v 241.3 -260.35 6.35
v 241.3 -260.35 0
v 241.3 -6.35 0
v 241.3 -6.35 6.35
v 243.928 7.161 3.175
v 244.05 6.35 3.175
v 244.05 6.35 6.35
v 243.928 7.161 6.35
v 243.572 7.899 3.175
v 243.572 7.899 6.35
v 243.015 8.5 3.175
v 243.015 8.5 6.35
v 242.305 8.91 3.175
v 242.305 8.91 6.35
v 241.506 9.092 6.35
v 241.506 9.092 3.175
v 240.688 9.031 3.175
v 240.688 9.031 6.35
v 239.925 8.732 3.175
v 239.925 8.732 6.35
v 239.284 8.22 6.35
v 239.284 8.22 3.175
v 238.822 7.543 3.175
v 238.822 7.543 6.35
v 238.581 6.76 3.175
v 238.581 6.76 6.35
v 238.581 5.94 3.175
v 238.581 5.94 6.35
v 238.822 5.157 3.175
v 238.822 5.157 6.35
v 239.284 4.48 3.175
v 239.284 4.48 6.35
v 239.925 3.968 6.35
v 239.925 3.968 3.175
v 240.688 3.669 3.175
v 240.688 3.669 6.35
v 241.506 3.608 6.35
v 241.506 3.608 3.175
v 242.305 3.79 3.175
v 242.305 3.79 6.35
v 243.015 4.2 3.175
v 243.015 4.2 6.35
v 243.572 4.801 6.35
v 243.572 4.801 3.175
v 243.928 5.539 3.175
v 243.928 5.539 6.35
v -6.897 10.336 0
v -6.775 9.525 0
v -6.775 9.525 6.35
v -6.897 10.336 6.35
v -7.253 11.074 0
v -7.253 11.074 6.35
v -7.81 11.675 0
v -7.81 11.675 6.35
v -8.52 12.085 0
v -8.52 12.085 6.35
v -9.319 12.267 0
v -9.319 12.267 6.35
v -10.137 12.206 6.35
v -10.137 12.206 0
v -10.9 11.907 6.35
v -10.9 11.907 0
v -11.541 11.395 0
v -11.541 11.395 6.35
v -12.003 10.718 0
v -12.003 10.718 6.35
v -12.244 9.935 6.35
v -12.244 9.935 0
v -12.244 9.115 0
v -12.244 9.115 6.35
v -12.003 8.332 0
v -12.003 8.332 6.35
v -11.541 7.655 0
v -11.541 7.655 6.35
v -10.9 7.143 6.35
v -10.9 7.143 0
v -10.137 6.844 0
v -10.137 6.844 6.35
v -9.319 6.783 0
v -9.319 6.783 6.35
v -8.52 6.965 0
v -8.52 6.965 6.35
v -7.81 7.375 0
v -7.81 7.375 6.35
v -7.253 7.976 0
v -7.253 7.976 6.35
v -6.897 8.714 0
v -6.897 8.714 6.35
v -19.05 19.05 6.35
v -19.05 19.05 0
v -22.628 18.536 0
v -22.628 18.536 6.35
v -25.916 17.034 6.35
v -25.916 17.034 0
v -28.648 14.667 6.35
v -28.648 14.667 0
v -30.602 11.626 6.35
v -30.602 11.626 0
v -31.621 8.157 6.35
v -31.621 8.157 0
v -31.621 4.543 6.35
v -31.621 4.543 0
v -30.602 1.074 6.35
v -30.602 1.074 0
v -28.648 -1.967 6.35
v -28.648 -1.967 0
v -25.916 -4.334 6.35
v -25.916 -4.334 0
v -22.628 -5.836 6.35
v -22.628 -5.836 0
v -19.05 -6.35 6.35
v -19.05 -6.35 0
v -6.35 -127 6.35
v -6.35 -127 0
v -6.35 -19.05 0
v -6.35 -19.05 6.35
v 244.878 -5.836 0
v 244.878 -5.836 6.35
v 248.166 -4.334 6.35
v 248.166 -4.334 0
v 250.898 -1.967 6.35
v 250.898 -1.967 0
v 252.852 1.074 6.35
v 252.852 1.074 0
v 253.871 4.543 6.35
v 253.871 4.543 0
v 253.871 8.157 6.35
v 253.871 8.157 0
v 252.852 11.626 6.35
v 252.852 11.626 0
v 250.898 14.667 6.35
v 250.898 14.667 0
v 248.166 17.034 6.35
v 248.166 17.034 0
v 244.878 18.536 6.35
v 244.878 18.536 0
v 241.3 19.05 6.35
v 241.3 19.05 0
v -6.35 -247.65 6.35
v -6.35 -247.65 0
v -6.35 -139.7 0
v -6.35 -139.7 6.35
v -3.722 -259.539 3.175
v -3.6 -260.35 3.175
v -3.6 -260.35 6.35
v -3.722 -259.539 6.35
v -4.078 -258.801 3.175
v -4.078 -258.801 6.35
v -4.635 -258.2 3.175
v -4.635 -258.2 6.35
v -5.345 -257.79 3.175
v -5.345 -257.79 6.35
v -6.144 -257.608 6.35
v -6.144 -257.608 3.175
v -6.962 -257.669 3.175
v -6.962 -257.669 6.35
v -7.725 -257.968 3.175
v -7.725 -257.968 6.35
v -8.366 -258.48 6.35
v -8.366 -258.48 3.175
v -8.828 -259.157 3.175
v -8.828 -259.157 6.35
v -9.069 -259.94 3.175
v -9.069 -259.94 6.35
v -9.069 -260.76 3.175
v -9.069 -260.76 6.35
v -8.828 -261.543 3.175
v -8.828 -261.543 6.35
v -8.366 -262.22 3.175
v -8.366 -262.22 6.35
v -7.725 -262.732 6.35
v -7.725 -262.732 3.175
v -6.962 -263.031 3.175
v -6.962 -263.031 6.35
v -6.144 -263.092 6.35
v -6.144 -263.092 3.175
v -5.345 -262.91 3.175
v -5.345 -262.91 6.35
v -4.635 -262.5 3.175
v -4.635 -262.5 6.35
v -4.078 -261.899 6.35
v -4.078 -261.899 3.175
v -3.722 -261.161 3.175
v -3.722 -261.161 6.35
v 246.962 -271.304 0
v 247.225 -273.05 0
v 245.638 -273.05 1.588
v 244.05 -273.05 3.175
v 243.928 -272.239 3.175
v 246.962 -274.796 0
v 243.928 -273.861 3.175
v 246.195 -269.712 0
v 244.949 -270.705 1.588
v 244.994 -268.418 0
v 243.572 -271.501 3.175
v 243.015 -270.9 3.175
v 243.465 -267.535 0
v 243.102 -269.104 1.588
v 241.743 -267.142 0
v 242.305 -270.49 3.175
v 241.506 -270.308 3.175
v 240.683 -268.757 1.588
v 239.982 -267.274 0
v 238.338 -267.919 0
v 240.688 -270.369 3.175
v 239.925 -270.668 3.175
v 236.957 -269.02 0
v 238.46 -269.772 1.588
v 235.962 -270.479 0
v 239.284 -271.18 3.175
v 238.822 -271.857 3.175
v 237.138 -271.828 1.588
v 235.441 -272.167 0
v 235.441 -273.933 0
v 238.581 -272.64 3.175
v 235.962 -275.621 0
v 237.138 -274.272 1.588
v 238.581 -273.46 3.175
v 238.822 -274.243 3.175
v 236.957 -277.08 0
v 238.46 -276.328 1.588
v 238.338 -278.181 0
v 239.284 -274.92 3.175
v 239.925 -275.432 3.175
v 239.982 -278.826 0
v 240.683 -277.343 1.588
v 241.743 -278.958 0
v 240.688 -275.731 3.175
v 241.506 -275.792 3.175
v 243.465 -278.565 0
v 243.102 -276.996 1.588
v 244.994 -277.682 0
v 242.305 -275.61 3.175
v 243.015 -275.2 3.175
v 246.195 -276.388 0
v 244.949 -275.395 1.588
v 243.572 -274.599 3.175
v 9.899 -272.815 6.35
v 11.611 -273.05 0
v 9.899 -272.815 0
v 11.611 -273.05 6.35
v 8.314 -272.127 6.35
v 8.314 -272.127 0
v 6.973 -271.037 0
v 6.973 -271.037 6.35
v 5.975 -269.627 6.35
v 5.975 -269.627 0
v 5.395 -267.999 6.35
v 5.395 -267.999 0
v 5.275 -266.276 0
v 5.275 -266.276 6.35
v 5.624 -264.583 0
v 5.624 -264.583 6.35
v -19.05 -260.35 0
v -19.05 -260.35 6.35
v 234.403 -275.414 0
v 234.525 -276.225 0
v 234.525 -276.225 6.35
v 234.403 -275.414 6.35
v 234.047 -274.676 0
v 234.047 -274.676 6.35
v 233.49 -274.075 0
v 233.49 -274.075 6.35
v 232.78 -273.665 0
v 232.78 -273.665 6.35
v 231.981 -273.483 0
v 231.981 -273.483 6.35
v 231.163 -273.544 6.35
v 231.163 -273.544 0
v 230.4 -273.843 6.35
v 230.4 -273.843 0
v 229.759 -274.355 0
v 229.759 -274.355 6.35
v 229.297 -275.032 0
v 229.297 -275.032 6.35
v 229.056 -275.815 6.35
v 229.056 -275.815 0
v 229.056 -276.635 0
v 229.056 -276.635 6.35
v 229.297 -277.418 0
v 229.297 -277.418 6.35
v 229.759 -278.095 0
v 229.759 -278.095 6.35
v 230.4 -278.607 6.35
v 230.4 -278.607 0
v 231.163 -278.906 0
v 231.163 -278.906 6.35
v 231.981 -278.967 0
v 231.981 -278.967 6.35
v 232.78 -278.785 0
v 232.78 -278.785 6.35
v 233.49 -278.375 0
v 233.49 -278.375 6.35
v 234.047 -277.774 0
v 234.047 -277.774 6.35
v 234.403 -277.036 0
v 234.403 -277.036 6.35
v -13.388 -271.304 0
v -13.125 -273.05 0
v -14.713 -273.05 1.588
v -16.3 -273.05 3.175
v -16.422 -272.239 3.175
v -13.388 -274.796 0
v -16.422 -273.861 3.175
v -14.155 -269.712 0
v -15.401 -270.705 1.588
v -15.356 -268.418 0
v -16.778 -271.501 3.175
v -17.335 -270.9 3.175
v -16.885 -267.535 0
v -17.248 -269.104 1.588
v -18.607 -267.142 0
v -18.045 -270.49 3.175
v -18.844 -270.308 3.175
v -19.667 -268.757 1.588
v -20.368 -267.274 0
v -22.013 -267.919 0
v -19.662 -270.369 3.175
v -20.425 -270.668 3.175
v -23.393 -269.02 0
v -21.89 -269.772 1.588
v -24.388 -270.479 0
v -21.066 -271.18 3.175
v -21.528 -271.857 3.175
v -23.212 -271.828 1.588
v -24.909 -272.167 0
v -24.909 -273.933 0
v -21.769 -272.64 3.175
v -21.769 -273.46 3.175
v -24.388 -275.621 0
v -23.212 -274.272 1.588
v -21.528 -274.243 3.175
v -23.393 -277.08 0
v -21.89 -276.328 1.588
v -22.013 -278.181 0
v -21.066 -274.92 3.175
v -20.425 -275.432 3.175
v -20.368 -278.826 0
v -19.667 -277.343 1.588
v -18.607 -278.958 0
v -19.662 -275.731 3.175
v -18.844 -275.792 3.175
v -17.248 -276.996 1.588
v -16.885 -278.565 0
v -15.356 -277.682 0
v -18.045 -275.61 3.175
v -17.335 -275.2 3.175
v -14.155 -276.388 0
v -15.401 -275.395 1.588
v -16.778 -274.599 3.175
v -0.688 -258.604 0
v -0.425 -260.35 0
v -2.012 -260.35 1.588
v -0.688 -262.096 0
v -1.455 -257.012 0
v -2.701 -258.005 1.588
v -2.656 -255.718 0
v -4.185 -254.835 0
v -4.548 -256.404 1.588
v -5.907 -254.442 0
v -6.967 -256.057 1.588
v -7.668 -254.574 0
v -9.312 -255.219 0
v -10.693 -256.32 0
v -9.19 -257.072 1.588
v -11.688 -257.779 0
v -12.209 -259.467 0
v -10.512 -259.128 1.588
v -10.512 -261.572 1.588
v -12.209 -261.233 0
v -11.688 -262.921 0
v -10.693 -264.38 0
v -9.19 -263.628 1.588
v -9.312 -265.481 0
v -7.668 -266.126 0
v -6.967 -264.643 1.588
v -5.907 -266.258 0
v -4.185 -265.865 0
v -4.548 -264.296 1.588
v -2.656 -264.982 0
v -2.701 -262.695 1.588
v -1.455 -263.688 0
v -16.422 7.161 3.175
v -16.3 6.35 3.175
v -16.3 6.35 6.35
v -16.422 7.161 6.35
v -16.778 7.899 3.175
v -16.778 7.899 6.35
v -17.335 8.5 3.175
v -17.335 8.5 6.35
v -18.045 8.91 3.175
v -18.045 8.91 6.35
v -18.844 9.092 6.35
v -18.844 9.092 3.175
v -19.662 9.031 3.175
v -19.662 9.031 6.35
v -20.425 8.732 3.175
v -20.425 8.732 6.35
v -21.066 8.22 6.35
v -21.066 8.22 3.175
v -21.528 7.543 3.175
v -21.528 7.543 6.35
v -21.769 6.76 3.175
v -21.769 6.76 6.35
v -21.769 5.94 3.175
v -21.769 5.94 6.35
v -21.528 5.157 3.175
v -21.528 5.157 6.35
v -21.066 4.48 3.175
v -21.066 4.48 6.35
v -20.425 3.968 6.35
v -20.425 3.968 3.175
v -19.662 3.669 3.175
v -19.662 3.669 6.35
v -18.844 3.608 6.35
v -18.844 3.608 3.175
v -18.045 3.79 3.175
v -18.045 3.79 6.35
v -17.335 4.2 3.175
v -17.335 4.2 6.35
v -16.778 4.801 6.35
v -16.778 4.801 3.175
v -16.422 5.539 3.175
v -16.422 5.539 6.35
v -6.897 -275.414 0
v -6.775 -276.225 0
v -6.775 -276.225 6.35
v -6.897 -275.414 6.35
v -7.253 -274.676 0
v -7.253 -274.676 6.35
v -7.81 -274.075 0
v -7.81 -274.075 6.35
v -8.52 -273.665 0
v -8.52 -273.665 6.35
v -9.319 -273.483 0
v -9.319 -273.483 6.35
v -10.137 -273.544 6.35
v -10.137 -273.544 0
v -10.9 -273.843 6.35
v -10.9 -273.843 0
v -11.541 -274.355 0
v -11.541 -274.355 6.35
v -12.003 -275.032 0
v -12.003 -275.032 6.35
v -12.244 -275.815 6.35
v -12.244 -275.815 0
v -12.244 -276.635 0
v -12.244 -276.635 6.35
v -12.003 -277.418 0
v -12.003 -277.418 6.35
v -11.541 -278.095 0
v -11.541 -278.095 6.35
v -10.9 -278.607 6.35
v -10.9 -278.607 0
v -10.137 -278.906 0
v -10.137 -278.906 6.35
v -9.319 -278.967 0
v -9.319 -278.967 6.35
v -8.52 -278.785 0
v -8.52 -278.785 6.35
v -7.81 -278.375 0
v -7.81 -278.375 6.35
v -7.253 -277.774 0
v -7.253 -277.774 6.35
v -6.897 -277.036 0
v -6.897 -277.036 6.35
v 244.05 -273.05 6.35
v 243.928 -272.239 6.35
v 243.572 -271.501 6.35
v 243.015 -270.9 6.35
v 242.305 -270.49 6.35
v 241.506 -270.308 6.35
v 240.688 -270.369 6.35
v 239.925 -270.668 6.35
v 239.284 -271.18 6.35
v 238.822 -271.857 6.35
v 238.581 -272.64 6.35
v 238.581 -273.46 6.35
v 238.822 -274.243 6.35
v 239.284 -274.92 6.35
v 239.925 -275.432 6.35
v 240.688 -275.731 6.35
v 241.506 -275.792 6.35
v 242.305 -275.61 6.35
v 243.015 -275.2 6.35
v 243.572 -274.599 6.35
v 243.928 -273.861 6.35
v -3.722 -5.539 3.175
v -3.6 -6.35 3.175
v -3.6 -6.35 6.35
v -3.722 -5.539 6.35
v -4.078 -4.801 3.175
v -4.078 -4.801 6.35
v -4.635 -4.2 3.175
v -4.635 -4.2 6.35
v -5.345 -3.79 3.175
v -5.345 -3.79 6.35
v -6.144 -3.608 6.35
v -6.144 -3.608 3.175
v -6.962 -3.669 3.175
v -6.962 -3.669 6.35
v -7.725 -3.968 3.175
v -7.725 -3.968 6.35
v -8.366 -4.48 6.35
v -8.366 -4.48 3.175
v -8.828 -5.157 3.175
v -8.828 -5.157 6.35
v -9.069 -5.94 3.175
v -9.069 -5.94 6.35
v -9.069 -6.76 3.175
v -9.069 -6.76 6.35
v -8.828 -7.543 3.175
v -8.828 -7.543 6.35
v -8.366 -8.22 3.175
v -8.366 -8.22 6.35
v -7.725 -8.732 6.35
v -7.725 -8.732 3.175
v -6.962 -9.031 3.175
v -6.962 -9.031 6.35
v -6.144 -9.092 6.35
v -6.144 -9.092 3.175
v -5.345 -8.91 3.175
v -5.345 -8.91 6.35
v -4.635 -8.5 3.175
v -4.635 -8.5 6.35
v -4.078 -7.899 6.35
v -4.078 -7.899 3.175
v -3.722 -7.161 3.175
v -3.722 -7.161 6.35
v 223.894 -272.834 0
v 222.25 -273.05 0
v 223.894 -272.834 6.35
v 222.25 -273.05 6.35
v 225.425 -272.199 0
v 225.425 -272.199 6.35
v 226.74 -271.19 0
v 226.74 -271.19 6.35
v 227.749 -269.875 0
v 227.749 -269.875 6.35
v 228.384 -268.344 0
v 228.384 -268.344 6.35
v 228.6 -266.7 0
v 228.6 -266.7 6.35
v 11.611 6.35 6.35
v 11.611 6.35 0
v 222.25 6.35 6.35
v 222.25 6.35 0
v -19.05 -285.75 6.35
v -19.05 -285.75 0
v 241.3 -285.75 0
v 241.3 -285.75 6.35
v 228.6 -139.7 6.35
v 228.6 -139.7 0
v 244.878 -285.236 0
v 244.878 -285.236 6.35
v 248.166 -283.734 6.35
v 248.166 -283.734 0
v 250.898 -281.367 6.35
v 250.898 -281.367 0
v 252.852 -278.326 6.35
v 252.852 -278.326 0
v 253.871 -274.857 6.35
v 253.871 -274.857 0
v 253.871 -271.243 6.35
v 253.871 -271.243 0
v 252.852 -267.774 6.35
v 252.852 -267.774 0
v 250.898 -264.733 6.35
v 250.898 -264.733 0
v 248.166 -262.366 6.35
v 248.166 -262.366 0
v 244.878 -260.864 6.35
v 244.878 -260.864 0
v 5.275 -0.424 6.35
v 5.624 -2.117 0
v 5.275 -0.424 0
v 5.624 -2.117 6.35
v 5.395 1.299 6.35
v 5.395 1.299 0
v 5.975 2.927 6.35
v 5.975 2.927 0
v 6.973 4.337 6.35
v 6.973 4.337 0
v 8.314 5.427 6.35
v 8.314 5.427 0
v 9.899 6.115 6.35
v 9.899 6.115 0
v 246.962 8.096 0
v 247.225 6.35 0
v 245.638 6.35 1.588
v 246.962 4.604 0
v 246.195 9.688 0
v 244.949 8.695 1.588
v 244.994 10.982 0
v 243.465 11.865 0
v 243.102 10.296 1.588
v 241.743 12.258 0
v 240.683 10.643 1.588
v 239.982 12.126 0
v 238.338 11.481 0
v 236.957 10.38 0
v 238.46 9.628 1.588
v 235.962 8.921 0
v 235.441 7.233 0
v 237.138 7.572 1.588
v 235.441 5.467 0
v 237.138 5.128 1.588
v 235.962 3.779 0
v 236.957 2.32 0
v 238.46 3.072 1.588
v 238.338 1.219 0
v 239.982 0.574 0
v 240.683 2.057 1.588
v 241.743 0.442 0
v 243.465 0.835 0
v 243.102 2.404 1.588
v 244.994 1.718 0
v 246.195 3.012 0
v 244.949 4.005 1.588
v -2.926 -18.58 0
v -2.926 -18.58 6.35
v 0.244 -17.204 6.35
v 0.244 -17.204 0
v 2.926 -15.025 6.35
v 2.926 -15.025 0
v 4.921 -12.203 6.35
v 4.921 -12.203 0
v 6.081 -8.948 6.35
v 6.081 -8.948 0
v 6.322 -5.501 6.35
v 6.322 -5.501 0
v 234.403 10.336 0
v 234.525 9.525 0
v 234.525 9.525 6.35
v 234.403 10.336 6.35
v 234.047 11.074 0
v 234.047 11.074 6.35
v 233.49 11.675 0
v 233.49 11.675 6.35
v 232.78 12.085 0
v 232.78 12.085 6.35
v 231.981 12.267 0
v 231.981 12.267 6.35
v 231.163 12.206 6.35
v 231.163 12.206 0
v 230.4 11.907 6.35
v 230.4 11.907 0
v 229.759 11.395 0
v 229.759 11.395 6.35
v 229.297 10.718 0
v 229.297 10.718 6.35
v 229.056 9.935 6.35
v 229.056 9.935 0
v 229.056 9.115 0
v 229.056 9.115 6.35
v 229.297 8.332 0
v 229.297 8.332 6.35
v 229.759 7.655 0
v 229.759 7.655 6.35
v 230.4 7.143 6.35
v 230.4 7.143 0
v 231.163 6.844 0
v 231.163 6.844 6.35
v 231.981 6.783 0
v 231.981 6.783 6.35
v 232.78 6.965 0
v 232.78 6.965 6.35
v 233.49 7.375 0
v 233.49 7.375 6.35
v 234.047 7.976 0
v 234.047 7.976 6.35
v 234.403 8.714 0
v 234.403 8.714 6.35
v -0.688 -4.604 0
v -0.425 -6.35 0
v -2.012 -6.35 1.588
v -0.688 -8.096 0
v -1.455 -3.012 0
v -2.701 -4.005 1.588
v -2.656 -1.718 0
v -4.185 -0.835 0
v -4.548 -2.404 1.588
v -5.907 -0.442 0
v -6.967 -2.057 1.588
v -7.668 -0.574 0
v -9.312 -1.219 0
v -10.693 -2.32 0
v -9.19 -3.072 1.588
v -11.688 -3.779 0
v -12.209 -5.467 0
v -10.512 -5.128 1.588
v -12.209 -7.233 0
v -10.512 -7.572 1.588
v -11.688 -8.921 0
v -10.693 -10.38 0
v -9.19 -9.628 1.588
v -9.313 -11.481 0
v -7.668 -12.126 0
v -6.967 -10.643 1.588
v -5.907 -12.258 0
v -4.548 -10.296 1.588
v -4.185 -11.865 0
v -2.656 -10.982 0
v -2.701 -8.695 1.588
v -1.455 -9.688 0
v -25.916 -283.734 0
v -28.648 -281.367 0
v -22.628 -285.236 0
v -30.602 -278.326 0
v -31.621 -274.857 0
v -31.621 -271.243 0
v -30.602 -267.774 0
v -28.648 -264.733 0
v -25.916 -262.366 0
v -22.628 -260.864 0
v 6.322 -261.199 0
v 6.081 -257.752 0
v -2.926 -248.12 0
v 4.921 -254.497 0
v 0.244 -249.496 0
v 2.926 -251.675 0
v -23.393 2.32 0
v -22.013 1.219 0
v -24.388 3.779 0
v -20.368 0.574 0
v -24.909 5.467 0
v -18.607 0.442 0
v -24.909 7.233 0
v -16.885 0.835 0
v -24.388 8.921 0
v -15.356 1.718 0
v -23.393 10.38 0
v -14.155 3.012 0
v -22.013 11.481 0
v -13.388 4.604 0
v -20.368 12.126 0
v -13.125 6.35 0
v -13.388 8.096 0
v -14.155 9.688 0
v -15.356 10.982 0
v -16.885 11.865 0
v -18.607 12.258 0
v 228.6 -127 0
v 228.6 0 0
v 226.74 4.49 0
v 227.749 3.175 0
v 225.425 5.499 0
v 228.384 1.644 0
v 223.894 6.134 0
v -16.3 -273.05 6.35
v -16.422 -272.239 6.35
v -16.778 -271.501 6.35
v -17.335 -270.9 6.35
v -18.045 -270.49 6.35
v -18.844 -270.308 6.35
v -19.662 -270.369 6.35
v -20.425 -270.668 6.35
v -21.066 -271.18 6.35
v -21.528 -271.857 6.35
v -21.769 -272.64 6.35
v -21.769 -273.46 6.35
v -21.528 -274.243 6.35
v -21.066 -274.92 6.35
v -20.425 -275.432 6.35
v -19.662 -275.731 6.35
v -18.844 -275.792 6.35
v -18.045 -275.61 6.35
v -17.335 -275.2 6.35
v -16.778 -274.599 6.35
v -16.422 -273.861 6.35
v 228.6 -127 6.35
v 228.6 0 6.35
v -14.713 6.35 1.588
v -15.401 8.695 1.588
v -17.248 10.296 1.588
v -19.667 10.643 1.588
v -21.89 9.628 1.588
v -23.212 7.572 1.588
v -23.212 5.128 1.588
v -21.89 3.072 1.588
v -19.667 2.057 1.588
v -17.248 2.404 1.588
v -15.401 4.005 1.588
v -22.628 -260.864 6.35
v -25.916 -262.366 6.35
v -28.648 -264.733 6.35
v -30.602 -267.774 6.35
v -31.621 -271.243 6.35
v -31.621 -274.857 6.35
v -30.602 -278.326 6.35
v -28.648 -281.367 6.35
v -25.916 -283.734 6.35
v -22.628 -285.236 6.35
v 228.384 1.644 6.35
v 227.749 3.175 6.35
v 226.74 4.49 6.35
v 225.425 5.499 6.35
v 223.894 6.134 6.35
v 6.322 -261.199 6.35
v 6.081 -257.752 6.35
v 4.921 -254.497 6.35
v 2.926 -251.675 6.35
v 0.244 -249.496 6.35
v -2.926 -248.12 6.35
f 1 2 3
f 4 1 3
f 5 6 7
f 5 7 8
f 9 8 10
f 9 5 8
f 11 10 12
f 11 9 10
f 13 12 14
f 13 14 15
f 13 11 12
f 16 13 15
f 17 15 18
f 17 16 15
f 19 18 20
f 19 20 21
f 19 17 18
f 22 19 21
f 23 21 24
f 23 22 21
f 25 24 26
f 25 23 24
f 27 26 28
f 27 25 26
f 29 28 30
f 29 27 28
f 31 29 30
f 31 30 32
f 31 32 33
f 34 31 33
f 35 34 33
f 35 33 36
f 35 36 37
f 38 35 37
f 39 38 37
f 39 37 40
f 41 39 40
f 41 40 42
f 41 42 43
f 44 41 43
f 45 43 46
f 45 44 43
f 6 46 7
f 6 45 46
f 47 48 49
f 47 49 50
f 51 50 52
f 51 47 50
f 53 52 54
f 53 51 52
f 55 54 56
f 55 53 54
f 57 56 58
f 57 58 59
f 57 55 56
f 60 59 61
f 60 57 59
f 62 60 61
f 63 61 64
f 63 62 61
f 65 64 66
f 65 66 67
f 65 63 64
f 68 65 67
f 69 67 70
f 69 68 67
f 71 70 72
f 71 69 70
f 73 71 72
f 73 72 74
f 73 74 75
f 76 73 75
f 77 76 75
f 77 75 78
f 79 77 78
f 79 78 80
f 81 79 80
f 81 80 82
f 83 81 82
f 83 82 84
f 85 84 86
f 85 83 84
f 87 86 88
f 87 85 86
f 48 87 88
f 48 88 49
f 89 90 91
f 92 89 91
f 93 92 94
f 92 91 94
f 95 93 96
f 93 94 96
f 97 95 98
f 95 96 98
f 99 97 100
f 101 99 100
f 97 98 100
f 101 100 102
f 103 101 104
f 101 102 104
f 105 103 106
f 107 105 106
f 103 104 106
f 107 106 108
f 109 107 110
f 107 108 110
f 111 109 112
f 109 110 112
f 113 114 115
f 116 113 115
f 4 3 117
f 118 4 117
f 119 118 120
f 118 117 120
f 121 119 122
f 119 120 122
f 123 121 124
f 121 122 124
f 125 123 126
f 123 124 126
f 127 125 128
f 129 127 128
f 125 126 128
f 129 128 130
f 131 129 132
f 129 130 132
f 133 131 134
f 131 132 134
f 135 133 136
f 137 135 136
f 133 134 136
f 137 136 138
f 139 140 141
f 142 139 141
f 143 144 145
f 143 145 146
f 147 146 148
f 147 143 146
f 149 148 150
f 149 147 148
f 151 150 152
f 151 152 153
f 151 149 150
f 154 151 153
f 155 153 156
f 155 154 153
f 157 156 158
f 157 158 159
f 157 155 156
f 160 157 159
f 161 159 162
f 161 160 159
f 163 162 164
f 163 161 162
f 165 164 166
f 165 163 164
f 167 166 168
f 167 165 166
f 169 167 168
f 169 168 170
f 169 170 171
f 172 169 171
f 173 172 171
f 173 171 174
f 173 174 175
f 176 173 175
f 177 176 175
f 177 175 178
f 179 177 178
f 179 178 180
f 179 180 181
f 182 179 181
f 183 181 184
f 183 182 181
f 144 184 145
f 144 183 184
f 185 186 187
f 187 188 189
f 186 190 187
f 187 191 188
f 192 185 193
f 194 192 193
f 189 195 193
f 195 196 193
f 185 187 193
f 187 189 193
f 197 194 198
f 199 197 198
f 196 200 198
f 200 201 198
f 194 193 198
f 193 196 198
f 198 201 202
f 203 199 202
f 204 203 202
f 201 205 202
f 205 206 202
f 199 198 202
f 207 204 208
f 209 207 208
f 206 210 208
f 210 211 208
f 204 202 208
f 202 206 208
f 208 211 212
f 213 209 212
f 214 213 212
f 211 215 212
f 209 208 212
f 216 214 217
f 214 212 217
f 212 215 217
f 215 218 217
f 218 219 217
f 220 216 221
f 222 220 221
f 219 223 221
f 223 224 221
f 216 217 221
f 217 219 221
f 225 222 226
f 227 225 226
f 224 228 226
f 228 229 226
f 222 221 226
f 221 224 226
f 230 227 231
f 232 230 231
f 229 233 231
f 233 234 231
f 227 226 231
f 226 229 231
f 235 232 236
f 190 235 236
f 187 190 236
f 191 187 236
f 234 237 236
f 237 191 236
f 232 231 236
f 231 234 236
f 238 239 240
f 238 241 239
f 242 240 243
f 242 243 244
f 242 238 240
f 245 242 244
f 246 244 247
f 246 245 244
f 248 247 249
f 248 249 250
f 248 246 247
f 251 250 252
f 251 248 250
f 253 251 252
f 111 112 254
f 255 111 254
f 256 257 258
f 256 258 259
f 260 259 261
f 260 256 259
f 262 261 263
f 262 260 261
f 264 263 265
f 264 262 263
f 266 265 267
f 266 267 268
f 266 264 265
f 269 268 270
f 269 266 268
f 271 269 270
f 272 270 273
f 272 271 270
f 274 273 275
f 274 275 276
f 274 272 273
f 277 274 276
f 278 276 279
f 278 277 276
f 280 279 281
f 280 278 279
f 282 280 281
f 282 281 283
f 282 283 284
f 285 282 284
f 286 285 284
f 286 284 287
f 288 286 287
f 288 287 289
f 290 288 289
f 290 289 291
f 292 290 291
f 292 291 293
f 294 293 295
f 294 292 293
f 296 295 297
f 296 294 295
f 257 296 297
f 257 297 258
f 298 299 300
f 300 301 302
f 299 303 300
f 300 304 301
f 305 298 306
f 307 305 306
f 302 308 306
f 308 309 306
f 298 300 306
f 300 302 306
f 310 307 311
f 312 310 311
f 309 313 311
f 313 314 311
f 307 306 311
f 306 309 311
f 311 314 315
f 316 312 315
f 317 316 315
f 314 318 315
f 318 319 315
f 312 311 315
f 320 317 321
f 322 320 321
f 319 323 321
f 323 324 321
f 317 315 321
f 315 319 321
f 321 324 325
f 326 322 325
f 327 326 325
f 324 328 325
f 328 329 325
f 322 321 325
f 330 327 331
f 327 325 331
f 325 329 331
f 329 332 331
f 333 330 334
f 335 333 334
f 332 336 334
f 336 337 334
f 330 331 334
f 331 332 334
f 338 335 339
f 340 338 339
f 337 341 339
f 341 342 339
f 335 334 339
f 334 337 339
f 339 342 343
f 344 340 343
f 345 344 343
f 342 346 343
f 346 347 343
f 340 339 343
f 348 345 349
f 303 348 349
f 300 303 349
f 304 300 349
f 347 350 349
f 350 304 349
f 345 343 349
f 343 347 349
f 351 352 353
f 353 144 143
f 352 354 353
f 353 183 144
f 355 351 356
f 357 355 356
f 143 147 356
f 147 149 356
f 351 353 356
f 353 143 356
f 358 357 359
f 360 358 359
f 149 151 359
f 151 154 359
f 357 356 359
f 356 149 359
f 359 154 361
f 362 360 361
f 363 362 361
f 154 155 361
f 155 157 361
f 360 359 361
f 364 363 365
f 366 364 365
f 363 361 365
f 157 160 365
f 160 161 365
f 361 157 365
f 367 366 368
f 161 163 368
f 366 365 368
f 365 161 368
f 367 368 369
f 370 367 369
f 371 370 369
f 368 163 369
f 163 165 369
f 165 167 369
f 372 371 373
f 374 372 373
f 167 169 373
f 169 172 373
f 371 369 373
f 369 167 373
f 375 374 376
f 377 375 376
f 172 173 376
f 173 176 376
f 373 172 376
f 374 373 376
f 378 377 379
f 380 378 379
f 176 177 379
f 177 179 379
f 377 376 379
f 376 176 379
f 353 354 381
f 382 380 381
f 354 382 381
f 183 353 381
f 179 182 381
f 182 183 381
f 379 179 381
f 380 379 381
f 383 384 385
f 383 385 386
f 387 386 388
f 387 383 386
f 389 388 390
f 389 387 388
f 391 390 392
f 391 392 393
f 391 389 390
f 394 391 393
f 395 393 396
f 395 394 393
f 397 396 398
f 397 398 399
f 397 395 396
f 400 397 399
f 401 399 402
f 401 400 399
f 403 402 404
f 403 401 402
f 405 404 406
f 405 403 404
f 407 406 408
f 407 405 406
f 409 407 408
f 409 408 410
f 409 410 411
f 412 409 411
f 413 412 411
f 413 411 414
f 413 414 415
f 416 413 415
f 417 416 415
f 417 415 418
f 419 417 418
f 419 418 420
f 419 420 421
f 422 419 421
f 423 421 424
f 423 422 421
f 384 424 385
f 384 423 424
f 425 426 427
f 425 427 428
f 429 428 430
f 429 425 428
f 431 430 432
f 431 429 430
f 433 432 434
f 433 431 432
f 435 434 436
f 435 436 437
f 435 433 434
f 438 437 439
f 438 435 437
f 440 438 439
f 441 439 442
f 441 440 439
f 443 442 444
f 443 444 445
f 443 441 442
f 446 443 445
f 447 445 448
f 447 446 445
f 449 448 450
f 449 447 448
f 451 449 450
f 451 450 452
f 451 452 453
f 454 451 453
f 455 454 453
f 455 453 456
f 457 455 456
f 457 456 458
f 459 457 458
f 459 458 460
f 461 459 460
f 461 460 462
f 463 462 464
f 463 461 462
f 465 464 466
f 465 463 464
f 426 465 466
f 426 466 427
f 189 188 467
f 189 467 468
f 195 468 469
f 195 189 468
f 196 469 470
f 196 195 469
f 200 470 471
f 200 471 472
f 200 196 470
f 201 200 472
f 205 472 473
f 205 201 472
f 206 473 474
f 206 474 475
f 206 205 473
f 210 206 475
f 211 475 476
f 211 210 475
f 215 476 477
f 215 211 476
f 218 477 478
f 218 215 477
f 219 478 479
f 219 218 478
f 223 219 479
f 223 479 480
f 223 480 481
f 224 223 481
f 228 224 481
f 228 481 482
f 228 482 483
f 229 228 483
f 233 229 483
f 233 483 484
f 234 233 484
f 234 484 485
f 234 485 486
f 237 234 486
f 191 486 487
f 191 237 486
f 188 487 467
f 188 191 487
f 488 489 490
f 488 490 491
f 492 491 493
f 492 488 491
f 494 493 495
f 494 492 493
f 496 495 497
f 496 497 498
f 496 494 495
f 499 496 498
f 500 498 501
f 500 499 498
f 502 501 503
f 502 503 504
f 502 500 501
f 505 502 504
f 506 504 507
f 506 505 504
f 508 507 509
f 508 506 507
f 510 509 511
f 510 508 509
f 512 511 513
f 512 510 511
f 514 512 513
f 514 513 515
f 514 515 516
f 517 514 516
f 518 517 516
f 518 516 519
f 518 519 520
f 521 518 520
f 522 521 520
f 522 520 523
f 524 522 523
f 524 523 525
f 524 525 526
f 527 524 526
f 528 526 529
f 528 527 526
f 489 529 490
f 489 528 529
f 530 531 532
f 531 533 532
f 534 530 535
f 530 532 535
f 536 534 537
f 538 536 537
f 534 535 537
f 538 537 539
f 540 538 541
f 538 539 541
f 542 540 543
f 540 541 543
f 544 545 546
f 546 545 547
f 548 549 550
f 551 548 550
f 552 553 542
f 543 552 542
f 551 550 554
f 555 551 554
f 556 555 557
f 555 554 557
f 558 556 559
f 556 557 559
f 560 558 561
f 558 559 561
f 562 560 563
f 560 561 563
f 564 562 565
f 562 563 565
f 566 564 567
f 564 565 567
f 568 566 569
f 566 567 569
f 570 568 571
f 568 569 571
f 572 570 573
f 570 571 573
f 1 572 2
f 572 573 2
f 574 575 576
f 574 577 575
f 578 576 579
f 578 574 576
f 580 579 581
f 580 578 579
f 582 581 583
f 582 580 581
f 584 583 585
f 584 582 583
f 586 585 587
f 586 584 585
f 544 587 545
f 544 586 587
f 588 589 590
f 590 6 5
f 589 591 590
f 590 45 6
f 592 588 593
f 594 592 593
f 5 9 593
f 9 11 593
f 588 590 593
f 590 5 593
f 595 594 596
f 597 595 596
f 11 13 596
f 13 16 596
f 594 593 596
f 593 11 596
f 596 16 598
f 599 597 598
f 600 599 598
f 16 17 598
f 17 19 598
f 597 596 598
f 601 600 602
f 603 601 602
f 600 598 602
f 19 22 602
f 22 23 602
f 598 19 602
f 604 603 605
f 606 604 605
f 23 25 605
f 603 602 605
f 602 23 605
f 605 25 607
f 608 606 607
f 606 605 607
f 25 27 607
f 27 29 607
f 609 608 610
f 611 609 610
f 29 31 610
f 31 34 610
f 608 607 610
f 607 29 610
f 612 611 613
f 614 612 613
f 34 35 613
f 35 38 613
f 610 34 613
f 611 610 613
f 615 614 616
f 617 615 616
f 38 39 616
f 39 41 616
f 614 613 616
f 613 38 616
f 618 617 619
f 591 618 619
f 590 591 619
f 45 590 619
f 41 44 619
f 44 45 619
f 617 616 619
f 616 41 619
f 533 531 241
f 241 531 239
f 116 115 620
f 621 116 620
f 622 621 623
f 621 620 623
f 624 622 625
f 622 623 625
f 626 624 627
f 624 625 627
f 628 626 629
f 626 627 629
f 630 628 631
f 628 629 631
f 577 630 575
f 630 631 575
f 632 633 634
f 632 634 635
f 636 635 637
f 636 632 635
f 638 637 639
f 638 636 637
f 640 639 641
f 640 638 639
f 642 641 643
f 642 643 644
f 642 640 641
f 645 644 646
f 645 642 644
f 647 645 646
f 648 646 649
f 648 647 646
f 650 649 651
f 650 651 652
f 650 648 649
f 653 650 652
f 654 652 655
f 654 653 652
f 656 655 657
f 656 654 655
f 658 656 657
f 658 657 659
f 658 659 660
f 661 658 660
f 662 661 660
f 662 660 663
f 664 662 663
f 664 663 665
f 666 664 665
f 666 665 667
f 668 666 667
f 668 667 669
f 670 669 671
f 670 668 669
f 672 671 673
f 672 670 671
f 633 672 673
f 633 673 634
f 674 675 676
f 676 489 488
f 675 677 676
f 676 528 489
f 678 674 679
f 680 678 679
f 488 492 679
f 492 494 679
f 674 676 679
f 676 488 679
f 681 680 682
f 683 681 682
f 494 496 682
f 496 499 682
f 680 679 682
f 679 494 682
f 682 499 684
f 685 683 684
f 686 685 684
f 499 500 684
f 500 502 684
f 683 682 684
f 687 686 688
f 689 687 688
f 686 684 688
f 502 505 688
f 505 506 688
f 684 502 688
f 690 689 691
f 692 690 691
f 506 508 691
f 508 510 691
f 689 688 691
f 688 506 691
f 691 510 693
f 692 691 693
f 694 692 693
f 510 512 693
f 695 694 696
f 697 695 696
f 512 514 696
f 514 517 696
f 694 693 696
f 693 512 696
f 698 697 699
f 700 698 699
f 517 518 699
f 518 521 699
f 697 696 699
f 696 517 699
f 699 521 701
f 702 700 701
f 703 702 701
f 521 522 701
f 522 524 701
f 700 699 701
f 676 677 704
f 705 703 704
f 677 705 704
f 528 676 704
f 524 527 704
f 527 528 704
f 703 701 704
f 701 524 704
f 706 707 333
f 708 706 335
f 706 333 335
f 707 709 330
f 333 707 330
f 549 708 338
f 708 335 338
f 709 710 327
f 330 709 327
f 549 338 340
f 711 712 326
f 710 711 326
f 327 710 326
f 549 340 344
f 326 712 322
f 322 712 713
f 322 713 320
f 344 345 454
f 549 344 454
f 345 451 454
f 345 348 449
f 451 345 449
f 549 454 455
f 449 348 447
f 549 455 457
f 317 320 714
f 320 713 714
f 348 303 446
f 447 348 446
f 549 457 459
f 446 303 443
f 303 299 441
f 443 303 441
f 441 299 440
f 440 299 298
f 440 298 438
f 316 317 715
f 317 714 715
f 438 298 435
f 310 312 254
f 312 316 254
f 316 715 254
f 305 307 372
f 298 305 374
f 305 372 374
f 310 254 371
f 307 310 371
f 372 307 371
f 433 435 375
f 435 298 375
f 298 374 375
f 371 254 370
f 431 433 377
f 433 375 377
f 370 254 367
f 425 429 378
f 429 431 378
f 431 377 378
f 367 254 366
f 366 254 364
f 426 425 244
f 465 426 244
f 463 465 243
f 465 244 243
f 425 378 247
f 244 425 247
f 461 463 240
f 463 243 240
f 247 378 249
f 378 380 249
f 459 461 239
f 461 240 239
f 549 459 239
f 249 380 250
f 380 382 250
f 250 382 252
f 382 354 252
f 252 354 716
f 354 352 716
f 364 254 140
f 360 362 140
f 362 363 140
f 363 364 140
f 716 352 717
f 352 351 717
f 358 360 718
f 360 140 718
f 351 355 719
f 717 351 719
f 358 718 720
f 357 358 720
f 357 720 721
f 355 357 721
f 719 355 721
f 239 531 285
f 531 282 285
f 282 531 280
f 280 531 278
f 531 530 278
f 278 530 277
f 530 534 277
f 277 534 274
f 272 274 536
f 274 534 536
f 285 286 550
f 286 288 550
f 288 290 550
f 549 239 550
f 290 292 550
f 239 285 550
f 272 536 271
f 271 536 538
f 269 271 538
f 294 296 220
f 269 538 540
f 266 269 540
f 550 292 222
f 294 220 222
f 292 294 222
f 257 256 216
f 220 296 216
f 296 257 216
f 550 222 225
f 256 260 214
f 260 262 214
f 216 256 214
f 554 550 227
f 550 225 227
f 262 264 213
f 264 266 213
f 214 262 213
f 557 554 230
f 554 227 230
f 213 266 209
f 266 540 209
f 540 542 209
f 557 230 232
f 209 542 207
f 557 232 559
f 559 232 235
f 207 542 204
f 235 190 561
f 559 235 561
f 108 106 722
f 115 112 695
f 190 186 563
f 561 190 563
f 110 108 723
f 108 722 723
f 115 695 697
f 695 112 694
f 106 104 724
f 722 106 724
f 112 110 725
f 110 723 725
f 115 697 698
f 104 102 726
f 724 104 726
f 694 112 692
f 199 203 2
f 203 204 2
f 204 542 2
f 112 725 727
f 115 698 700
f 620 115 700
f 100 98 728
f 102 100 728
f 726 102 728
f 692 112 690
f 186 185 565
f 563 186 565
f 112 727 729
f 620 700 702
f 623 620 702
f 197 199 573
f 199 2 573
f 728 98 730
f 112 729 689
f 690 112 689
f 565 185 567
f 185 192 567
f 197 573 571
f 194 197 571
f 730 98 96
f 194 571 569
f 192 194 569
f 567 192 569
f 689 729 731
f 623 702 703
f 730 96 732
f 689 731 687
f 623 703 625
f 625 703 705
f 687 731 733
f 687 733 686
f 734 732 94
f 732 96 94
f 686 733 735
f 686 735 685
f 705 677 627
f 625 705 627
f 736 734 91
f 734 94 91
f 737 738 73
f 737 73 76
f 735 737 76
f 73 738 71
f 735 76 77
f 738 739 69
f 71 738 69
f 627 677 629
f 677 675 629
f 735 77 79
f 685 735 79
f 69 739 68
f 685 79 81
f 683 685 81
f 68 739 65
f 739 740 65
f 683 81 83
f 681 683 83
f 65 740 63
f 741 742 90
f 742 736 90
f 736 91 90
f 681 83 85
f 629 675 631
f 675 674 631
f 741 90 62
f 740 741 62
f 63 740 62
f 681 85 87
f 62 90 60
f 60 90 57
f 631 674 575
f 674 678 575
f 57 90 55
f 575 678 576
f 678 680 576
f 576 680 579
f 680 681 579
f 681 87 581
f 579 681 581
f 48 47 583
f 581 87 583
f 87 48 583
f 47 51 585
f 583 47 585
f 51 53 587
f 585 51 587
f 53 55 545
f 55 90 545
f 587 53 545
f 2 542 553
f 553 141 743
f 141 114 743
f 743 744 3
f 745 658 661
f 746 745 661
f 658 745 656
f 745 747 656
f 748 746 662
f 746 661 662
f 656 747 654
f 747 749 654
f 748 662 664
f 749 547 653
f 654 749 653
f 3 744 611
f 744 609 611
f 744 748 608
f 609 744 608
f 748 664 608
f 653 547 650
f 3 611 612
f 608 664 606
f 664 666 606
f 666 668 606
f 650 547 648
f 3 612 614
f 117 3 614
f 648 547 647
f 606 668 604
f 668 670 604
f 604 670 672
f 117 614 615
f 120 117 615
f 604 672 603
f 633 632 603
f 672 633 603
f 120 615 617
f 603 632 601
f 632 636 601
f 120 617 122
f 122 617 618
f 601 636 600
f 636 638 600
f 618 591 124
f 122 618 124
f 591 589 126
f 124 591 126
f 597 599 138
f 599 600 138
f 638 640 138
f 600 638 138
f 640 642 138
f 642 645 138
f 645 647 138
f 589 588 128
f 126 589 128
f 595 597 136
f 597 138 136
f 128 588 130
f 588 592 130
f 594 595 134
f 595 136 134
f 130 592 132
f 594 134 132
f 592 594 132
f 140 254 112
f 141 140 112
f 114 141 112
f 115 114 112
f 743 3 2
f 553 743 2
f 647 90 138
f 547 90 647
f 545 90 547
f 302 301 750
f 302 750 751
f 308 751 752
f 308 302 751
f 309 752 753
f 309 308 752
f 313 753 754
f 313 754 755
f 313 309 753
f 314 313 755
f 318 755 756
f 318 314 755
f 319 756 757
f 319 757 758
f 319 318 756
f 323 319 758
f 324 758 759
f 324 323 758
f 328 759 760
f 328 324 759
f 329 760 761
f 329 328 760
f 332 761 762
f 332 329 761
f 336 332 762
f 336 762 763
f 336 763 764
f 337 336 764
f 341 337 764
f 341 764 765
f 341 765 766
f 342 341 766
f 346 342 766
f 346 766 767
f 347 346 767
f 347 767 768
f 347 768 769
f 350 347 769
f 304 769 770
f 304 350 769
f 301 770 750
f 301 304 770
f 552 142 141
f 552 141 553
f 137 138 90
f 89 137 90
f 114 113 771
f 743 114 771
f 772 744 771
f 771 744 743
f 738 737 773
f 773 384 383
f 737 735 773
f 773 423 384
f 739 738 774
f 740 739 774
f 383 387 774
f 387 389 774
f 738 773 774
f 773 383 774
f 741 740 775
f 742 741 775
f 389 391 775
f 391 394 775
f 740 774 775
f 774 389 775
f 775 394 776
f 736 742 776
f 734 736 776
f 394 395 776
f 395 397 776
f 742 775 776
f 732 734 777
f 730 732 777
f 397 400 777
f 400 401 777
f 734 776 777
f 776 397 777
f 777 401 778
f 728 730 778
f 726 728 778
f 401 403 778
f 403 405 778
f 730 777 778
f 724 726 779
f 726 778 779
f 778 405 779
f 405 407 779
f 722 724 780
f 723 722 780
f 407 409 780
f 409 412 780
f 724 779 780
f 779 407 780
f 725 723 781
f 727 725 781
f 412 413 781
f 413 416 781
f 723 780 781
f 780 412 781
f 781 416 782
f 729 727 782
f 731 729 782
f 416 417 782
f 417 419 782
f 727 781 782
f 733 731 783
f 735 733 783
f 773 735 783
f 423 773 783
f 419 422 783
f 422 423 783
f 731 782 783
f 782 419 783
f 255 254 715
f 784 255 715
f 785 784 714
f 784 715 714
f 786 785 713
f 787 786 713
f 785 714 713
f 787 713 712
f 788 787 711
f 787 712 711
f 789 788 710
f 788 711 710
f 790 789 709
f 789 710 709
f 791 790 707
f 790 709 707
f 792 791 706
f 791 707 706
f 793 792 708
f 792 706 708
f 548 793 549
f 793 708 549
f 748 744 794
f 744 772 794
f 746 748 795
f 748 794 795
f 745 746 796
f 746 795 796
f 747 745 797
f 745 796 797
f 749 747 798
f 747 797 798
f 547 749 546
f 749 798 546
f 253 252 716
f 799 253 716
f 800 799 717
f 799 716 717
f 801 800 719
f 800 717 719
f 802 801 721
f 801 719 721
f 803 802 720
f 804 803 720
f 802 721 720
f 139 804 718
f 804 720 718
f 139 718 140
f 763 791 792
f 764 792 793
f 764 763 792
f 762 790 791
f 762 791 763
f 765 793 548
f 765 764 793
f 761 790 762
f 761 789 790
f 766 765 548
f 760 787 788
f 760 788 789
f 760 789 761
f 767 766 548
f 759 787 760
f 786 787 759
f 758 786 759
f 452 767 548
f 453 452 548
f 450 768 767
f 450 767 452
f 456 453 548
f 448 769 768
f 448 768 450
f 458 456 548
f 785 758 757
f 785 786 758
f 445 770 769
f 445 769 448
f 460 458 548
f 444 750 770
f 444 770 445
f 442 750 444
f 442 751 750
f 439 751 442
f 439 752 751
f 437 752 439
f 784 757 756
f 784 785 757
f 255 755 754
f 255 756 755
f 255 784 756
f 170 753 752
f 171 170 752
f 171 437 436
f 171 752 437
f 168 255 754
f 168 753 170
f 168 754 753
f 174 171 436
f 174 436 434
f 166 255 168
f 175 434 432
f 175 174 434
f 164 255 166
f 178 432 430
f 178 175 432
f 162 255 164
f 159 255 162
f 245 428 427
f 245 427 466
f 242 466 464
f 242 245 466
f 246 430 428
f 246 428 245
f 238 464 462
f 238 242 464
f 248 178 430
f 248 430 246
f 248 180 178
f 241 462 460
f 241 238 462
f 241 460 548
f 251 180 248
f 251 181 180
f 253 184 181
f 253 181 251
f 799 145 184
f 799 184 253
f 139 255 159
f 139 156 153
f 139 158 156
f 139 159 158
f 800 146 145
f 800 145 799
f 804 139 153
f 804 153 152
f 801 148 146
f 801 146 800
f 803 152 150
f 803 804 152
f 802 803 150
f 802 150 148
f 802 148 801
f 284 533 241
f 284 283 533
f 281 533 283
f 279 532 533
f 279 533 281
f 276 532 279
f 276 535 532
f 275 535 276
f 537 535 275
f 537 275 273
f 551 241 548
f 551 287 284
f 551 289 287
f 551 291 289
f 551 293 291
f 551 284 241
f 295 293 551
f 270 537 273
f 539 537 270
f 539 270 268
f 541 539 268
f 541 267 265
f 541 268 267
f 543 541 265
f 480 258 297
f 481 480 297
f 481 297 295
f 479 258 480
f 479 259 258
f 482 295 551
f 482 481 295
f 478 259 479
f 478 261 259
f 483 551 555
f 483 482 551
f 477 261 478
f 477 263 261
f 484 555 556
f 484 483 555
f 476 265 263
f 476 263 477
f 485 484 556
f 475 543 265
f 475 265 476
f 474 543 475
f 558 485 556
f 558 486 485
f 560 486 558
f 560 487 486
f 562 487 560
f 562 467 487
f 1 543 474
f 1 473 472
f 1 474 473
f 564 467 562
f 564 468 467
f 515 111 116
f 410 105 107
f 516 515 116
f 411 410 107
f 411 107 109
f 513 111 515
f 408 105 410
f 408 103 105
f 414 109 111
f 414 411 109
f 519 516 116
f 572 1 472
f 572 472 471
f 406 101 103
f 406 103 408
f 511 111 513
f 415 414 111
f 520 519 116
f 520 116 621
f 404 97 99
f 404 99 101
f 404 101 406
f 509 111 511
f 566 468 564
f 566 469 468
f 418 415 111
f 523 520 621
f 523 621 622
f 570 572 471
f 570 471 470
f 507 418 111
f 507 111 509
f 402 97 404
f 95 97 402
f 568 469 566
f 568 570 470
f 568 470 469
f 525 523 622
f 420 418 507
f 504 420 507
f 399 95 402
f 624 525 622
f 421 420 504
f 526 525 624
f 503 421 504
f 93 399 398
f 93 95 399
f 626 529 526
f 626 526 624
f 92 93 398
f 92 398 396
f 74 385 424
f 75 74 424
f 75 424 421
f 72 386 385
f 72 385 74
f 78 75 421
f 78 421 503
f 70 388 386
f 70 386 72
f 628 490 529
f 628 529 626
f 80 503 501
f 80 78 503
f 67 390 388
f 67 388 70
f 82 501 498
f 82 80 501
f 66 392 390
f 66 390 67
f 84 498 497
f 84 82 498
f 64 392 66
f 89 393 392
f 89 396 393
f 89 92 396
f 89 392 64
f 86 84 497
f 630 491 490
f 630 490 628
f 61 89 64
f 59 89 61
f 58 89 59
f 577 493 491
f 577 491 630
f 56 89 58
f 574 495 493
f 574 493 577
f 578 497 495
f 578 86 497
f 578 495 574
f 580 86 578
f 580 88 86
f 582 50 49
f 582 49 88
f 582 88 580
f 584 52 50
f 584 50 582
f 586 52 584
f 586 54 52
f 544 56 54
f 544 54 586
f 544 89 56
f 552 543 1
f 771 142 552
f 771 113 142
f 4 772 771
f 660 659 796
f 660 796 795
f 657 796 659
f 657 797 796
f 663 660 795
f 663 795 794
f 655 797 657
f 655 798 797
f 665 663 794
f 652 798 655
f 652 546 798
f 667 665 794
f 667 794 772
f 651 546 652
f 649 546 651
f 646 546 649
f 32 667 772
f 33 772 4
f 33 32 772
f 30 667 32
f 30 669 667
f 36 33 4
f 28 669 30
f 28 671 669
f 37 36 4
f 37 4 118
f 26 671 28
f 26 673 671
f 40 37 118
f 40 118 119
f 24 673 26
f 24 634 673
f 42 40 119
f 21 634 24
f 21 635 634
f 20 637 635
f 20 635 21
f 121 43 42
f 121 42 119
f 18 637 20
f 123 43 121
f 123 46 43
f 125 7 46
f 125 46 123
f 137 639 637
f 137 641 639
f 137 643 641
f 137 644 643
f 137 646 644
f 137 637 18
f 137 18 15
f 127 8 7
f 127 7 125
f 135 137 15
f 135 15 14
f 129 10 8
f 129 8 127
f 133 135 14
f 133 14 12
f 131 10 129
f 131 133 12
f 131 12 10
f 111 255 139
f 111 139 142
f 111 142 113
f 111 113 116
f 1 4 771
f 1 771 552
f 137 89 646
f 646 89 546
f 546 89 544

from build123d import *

# Parameters (mm, degrees)
SKETCH1_R           = 2.75
BOSS_EXTRUDE1_DEPTH = 6.35
FILLET1_R           = 6.35
CHAMFER1_SIZE       = 3.175
SKETCH2_W           = 234.95
SKETCH2_H           = 12.7
BOSS_EXTRUDE2_DEPTH = 6.35


with BuildPart() as part:
    # Sketch1 → Boss-Extrude1 (new body)
    with BuildSketch(Plane.XY):
        with BuildLine():
            ThreePointArc((-19.05, 19.05), (-31.75, 6.35), (-19.05, -6.35))
            Line((-19.05, -6.35), (-19.05, -260.35))
            ThreePointArc((-19.05, -260.35), (-31.75, -273.05), (-19.05, -285.75))
            Line((-19.05, -285.75), (241.3, -285.75))
            ThreePointArc((241.3, -285.75), (254, -273.05), (241.3, -260.35))
            Line((241.3, -260.35), (241.3, -6.35))
            ThreePointArc((241.3, -6.35), (254, 6.35), (241.3, 19.05))
            Line((241.3, 19.05), (-19.05, 19.05))
        make_face()
        with Locations((241.3, 6.35)):
            Circle(SKETCH1_R, mode=Mode.SUBTRACT)
        with Locations((-19.05, -273.05)):
            Circle(SKETCH1_R, mode=Mode.SUBTRACT)
        with Locations((-9.525, -276.225)):
            Circle(SKETCH1_R, mode=Mode.SUBTRACT)
        with Locations((231.775, -276.225)):
            Circle(SKETCH1_R, mode=Mode.SUBTRACT)
        with Locations((241.3, -273.05)):
            Circle(SKETCH1_R, mode=Mode.SUBTRACT)
        with BuildLine():
            Line((-6.35, -247.65), (-6.35, -19.05))
            ThreePointArc((-6.35, -19.05), (6.35, -6.35), (-6.35, 6.35))
            Line((-6.35, 6.35), (228.6, 6.35))
            Line((228.6, 6.35), (228.6, -273.05))
            Line((228.6, -273.05), (-6.35, -273.05))
            ThreePointArc((-6.35, -273.05), (6.35, -260.35), (-6.35, -247.65))
        make_face(mode=Mode.SUBTRACT)
        with Locations((-6.35, -6.35)):
            Circle(SKETCH1_R, mode=Mode.SUBTRACT)
        with Locations((-6.35, -260.35)):
            Circle(SKETCH1_R, mode=Mode.SUBTRACT)
        with Locations((-19.05, 6.35)):
            Circle(SKETCH1_R, mode=Mode.SUBTRACT)
        with Locations((-9.525, 9.525)):
            Circle(SKETCH1_R, mode=Mode.SUBTRACT)
        with Locations((231.775, 9.525)):
            Circle(SKETCH1_R, mode=Mode.SUBTRACT)
    extrude(amount=BOSS_EXTRUDE1_DEPTH)

    # Fillet1
    fillet1_edges = [part.edges().sort_by_distance(p)[0] for p in [
        (228.6, -273.05, 3.175),
        (228.6, 6.35, 3.175),
        (-6.35, 6.35, 3.175),
    ]]
    fillet(fillet1_edges, radius=FILLET1_R)
    fillet1_2_edges = [part.edges().sort_by_distance(p)[0] for p in [
        (-6.35, -273.05, 3.175),
    ]]
    fillet(fillet1_2_edges, radius=FILLET1_R)

    # Chamfer1
    chamfer1_edges = [part.edges().sort_by_distance(p)[0] for p in [
        (-21.8, 6.35, 0),
        (-21.8, -273.05, 0),
        (238.55, 6.35, 0),
        (238.55, -273.05, 0),
        (-9.1, -260.35, 0),
        (-9.1, -6.35, 0),
    ]]
    chamfer(chamfer1_edges, length=CHAMFER1_SIZE)

    # Sketch2 → Boss-Extrude2 (add)
    with BuildSketch(Plane.XY.offset(6.35)):
        with Locations((111.125, -133.35)):
            Rectangle(SKETCH2_W, SKETCH2_H)
    extrude(amount=-BOSS_EXTRUDE2_DEPTH)


solid = part.part
